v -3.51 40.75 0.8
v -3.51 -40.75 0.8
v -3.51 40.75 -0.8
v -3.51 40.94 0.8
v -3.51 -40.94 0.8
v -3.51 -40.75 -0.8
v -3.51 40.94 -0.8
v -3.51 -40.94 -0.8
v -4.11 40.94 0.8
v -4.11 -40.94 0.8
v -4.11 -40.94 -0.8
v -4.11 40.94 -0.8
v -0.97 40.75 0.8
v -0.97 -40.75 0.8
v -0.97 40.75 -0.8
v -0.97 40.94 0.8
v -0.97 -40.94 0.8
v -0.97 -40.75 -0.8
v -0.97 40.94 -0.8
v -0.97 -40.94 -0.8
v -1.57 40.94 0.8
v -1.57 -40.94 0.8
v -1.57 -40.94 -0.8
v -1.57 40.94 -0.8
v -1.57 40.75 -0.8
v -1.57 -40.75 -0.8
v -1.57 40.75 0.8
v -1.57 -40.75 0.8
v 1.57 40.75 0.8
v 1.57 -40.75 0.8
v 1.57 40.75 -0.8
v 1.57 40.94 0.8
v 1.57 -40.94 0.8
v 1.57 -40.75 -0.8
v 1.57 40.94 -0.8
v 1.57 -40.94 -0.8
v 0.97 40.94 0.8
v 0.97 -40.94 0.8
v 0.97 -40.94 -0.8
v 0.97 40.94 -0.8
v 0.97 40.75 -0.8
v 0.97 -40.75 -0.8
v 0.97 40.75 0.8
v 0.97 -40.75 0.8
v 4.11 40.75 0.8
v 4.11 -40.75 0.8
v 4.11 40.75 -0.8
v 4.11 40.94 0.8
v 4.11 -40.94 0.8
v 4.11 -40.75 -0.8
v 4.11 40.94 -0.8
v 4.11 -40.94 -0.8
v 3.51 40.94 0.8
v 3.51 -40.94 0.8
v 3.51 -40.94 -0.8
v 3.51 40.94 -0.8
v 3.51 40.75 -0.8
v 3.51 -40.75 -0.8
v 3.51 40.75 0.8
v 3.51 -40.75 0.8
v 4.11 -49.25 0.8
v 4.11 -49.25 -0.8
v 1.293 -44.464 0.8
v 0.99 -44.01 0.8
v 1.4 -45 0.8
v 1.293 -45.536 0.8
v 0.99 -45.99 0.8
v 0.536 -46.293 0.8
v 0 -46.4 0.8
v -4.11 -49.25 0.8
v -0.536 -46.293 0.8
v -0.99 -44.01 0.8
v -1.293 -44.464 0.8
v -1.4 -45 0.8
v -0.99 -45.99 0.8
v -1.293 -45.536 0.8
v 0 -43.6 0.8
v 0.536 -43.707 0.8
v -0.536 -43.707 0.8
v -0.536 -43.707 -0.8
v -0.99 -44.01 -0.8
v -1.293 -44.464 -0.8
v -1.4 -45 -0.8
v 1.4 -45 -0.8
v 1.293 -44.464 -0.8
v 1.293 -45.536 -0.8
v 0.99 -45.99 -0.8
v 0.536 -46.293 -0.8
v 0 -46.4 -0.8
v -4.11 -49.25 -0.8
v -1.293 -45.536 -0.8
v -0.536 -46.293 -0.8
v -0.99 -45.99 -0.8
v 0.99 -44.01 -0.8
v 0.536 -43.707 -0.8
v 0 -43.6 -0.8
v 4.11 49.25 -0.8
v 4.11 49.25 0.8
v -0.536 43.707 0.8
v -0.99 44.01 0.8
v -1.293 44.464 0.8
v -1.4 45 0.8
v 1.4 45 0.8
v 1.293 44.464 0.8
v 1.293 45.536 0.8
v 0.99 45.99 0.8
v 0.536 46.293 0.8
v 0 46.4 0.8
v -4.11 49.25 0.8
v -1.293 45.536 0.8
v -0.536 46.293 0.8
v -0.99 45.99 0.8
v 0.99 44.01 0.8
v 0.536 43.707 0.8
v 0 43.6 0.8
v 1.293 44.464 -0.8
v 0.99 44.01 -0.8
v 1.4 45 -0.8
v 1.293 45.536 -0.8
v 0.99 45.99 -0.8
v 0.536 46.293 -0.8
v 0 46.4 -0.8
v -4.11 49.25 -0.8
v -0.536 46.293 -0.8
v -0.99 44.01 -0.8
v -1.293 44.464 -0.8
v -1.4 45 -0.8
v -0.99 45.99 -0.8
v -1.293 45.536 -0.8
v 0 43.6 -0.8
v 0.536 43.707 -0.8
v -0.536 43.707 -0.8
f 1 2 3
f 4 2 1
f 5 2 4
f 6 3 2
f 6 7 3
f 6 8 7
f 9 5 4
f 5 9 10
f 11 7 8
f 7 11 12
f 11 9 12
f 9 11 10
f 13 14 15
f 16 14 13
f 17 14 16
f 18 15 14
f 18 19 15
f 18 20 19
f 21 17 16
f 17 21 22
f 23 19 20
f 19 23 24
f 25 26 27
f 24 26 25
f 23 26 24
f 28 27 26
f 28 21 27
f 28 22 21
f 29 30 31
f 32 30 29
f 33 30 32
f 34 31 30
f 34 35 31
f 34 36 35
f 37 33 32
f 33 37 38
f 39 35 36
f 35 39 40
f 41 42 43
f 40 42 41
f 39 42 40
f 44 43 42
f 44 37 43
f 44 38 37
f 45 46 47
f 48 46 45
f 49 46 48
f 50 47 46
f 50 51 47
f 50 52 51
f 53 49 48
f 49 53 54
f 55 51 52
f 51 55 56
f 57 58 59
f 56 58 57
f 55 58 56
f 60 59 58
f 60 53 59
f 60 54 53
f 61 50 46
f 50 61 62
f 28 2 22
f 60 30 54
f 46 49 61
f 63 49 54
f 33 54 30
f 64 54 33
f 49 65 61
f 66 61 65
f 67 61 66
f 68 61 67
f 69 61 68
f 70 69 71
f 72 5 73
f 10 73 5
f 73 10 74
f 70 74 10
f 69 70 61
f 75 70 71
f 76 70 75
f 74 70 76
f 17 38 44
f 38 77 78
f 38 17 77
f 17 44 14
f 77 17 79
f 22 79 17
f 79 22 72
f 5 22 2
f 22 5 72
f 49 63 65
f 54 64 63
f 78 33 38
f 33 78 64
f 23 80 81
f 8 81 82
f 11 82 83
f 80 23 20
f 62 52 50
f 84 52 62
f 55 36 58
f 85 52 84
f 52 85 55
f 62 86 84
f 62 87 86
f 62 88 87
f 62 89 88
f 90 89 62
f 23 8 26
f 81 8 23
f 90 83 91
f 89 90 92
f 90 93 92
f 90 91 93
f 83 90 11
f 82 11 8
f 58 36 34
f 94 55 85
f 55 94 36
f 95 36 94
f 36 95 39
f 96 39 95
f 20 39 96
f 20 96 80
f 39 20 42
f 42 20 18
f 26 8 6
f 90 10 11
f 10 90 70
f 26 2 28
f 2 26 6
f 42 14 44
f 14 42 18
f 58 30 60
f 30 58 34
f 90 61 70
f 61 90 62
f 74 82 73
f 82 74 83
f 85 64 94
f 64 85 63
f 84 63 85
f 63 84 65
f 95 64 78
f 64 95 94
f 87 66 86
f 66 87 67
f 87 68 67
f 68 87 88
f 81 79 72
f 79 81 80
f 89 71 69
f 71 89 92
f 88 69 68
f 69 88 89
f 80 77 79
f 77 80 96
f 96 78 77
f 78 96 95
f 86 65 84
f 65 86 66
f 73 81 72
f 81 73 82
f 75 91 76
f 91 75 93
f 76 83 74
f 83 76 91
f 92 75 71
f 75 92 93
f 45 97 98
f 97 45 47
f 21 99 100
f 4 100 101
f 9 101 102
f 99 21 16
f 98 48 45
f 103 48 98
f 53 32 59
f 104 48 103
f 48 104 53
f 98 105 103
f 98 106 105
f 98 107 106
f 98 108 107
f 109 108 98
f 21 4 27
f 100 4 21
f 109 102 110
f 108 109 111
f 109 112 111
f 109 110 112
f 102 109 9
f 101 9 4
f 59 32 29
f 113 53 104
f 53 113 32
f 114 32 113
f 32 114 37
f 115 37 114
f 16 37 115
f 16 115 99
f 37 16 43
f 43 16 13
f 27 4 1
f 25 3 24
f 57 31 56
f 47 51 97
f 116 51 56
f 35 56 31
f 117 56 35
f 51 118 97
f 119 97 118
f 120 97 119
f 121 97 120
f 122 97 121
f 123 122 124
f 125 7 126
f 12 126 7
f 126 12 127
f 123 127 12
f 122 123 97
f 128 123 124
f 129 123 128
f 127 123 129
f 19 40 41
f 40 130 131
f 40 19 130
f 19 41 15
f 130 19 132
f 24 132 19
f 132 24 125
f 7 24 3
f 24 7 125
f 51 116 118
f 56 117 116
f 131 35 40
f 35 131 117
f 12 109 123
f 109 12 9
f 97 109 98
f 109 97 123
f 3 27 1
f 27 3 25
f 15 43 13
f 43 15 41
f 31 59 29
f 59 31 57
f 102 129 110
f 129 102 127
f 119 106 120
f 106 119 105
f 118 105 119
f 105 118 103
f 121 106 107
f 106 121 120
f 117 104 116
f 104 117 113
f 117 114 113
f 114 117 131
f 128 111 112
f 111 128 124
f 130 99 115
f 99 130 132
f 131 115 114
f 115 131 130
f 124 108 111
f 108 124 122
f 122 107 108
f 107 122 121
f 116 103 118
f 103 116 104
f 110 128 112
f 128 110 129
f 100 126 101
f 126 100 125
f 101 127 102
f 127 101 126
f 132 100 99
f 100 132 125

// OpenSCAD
// file: motherboard_dim.scad
// motherboard pcb dimensions
motherboard_w=100;   // pcb width
motherboard_t=1.6;   // pcb thickness
motherboard_pass=0.5;// gap to fit screws 
step=25.4;           // distance between modules

// connector dimensions
motherboard_con_head_w=85;  // width of the connector head
motherboard_con_head_d=8.5; // depth of the connector head
motherboard_con_w=95;       // largest width of the connector
motherboard_con_h=11.6;     // largest height of the connector
motherboard_con_t=11;       // largest depth of the connector
motherboard_con_d_w=90;     // distance between mounting holes
motherboard_con_d=2.8;      // diameter of mounting holes
motherboard_con_out=5.2;    // height produced by the connector when pulgged in 

// pcb module connector dimension
pcbmodule_con_out=13-(5.3+2.8-2.54);  // distance connector sticks out of pcb

// offset
motherboard_z_offset= -(pcbmodule_con_out+motherboard_con_out+motherboard_t); // z offset motherboard built in
// main file
// spacer for connectors when not having a motherboard
include <motherboard_dim.scad>
w=0.6;
s=2.54;
translate([-(3*s)/2-w/2,-(32*s+w)/2,-motherboard_t/2]){
        for(i=[0:3]){
        translate([i*s,0,0])
        cube([w,32*s+w,motherboard_t]);
    }    
}
for(i=[-1,1]){ // mounting holes
      translate([0,i*motherboard_con_d_w/2,0])difference(){
          cube([3*s+w,8.5,motherboard_t],center=true);
          cylinder(d=motherboard_con_d,h=motherboard_con_h,center=true,$fn=16); 
      }
}
